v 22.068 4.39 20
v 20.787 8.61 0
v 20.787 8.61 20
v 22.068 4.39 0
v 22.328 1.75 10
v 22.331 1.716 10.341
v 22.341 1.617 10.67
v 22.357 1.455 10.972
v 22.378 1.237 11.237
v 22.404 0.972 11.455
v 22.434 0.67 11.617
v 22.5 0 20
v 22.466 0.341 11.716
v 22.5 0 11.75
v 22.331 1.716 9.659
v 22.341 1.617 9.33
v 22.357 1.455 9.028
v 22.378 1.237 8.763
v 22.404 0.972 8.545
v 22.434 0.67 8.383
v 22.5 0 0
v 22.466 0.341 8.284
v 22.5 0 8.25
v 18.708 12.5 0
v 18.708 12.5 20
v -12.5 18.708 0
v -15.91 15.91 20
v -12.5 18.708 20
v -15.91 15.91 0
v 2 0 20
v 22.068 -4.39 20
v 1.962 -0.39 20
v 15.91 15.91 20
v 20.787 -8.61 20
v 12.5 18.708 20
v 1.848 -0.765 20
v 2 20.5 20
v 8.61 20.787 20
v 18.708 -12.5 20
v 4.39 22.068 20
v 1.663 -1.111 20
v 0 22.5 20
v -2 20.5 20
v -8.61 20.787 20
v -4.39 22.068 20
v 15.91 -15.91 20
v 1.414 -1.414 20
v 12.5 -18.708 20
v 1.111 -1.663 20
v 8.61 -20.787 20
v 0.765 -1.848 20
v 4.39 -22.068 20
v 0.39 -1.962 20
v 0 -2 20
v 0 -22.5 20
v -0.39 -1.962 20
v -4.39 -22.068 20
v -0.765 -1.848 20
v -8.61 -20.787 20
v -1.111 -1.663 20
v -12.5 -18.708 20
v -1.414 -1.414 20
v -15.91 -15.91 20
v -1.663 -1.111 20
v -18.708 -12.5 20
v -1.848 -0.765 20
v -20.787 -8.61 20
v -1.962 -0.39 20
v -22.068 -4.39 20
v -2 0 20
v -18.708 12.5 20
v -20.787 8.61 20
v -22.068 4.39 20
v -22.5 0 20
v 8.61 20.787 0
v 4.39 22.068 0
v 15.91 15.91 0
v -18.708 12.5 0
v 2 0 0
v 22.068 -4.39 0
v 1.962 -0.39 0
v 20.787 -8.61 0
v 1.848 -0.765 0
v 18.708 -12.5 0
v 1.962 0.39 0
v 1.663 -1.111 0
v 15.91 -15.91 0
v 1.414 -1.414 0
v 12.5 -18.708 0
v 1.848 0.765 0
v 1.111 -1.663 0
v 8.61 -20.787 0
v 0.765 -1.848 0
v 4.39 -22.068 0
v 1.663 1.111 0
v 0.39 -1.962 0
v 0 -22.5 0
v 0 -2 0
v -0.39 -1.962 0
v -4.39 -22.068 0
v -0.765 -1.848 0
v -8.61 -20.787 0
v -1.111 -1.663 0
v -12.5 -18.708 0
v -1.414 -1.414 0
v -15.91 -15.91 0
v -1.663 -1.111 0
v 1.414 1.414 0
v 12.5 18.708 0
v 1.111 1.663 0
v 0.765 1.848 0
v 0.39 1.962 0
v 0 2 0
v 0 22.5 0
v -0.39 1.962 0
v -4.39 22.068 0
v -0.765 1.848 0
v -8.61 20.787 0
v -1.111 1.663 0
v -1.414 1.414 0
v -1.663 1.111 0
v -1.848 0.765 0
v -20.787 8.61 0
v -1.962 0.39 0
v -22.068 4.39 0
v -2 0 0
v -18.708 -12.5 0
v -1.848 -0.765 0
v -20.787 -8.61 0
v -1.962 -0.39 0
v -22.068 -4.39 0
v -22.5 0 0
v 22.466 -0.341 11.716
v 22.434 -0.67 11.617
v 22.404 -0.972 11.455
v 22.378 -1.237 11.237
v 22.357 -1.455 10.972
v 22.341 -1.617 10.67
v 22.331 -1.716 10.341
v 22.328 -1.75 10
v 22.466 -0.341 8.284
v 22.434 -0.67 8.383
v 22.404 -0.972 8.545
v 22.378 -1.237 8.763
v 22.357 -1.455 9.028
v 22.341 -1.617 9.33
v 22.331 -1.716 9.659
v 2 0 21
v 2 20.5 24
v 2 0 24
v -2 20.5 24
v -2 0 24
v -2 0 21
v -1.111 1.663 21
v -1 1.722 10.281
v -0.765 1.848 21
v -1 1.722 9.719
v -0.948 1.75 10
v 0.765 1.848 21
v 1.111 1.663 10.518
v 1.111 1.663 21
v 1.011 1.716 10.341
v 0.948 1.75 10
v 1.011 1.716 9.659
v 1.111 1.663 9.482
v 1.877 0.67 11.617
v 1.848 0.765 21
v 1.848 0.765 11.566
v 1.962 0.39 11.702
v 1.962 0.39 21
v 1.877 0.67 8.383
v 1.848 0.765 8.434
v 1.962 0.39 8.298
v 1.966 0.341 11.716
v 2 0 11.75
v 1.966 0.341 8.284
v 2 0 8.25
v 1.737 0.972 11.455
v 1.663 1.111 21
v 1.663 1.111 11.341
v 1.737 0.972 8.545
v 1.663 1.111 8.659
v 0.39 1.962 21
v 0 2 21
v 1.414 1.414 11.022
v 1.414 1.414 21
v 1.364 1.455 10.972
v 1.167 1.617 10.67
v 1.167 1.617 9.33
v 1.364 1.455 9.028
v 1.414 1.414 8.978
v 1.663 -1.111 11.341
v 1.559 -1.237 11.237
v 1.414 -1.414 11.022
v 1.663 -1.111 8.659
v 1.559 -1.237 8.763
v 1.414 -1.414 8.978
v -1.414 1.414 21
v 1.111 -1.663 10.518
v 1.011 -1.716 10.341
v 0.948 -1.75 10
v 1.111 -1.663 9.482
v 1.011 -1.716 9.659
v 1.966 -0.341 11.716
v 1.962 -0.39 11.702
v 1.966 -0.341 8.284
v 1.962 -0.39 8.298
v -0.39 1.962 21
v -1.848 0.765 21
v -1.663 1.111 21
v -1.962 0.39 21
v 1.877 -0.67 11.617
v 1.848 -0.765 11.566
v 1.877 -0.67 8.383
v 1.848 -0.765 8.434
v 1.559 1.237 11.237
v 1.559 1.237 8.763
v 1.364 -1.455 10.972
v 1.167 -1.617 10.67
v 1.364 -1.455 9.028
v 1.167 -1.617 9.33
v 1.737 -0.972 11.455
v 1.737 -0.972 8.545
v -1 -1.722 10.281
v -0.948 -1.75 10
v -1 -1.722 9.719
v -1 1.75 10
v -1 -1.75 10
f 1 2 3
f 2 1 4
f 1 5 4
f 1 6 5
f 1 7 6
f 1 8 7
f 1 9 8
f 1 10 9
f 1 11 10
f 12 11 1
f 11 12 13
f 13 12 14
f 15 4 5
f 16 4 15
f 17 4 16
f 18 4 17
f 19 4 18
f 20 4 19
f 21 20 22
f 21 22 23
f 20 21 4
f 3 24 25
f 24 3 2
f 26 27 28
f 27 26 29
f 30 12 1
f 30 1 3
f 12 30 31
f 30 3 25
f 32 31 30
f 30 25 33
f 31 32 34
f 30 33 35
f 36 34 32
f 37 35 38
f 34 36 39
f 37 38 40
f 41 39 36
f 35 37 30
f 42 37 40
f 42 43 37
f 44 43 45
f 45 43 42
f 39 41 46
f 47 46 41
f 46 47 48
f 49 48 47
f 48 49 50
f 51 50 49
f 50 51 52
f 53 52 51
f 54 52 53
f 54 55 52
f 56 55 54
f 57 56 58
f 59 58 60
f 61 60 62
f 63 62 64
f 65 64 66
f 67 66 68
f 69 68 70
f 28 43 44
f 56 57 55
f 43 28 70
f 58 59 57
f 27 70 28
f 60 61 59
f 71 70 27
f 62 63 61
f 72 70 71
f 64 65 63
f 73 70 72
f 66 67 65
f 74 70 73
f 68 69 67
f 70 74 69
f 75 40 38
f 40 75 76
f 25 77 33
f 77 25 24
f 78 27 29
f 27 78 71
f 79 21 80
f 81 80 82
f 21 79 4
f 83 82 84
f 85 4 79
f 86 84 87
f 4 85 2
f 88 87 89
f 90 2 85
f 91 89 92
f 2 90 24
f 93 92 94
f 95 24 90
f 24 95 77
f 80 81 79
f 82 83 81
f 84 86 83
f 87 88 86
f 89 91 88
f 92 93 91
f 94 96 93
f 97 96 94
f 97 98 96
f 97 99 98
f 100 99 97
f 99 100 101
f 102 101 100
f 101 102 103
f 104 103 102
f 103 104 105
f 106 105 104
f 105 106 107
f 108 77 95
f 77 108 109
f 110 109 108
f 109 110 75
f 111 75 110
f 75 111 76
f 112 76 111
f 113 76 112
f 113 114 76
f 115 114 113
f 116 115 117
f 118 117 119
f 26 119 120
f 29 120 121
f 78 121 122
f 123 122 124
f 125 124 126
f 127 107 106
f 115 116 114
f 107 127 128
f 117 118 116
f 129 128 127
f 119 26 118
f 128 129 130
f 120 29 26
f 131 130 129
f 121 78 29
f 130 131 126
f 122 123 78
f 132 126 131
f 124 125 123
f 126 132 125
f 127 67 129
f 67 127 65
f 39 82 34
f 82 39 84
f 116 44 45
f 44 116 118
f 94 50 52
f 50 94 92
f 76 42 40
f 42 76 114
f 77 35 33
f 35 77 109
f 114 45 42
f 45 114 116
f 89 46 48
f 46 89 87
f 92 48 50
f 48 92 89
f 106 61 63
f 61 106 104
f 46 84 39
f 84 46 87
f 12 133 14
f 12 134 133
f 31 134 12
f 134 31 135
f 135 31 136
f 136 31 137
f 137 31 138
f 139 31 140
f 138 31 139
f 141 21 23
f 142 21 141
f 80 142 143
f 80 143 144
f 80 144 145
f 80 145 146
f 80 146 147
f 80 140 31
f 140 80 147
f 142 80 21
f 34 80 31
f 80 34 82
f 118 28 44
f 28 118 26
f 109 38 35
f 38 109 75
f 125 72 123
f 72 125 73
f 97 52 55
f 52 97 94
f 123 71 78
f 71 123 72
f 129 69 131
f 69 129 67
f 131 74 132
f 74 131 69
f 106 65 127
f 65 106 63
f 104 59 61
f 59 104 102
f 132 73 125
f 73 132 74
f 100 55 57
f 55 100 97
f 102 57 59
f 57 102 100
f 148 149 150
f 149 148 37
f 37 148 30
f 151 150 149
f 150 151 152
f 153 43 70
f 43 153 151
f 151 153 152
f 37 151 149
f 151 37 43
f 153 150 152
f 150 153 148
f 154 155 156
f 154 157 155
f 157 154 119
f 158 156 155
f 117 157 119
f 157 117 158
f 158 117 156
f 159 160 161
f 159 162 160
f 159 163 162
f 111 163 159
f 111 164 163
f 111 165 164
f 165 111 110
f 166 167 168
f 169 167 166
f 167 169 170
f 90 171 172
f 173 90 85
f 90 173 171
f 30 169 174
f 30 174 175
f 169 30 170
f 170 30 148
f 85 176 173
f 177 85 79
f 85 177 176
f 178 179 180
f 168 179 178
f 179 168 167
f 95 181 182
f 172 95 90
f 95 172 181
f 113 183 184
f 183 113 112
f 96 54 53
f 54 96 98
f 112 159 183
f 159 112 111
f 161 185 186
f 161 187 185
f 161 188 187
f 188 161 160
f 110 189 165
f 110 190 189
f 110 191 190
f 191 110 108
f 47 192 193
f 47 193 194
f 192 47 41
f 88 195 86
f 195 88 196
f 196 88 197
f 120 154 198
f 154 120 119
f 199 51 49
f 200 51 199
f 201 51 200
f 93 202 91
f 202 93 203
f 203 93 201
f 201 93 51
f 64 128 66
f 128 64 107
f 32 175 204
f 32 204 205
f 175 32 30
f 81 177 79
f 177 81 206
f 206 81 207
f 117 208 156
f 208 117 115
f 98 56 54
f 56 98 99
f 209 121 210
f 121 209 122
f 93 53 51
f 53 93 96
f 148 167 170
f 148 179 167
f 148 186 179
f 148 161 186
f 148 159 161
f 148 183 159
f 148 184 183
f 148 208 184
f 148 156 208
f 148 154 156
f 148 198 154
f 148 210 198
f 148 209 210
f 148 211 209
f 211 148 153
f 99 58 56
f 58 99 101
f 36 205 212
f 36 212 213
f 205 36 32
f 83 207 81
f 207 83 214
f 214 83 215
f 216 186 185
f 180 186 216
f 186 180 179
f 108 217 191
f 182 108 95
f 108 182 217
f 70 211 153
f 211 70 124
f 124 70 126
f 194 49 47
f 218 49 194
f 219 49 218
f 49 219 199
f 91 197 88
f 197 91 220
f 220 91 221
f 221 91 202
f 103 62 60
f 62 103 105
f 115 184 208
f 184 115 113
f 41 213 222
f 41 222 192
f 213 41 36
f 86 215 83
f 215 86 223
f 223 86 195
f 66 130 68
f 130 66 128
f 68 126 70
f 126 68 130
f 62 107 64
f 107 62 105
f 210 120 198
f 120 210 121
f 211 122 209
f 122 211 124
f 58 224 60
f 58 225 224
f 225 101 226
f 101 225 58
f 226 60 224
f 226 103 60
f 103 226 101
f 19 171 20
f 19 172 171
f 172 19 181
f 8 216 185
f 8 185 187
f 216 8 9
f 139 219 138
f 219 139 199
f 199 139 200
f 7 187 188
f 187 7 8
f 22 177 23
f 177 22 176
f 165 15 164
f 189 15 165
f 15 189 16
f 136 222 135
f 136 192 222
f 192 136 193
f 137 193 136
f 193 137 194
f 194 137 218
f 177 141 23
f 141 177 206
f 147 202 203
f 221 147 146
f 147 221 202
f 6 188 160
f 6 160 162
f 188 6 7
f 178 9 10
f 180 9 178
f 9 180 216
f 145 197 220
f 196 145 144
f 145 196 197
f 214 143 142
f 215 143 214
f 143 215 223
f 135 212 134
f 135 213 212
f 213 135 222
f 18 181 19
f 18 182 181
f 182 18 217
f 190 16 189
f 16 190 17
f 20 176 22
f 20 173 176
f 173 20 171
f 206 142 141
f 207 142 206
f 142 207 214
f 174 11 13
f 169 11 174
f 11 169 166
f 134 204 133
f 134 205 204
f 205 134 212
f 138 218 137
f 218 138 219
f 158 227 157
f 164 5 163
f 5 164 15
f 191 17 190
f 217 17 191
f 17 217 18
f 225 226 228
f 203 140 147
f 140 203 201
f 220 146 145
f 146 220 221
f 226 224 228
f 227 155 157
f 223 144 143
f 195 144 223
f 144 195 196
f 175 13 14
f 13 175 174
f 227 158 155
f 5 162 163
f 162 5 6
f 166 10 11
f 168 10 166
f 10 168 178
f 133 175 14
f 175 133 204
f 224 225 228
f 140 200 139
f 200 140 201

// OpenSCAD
$fn = 32;

// ----------------------------------------------------------------------
// Control knob: pointer knob
// ----------------------------------------------------------------------

// --- parameters (mm) ---
rib_w = 4;                // pointer rib width
rib_h = 5;                // pointer rib height
knob_d = 45;              // knob body diameter
knob_h = 20;              // knob body height
bore_d = 4;               // shaft bore diameter
set_d = 3.5;              // set screw bore diameter

rib_poke = rib_h - 1;  // rib height above the top
total_h = knob_h + rib_h - 1;  // overall height

difference() {
  union() {
    cylinder(h = knob_h, d = knob_d);
    translate([-rib_w / 2, 0, knob_h - 1])
      cube([rib_w, knob_d / 2 - 2, rib_h]);
  }
  translate([0, 0, -1]) cylinder(h = knob_h + 2, d = bore_d);
  translate([-1, 0, knob_h / 2]) rotate([0, 90, 0])
    cylinder(h = knob_d / 2 + bore_d / 2 + 2, d = set_d);}
